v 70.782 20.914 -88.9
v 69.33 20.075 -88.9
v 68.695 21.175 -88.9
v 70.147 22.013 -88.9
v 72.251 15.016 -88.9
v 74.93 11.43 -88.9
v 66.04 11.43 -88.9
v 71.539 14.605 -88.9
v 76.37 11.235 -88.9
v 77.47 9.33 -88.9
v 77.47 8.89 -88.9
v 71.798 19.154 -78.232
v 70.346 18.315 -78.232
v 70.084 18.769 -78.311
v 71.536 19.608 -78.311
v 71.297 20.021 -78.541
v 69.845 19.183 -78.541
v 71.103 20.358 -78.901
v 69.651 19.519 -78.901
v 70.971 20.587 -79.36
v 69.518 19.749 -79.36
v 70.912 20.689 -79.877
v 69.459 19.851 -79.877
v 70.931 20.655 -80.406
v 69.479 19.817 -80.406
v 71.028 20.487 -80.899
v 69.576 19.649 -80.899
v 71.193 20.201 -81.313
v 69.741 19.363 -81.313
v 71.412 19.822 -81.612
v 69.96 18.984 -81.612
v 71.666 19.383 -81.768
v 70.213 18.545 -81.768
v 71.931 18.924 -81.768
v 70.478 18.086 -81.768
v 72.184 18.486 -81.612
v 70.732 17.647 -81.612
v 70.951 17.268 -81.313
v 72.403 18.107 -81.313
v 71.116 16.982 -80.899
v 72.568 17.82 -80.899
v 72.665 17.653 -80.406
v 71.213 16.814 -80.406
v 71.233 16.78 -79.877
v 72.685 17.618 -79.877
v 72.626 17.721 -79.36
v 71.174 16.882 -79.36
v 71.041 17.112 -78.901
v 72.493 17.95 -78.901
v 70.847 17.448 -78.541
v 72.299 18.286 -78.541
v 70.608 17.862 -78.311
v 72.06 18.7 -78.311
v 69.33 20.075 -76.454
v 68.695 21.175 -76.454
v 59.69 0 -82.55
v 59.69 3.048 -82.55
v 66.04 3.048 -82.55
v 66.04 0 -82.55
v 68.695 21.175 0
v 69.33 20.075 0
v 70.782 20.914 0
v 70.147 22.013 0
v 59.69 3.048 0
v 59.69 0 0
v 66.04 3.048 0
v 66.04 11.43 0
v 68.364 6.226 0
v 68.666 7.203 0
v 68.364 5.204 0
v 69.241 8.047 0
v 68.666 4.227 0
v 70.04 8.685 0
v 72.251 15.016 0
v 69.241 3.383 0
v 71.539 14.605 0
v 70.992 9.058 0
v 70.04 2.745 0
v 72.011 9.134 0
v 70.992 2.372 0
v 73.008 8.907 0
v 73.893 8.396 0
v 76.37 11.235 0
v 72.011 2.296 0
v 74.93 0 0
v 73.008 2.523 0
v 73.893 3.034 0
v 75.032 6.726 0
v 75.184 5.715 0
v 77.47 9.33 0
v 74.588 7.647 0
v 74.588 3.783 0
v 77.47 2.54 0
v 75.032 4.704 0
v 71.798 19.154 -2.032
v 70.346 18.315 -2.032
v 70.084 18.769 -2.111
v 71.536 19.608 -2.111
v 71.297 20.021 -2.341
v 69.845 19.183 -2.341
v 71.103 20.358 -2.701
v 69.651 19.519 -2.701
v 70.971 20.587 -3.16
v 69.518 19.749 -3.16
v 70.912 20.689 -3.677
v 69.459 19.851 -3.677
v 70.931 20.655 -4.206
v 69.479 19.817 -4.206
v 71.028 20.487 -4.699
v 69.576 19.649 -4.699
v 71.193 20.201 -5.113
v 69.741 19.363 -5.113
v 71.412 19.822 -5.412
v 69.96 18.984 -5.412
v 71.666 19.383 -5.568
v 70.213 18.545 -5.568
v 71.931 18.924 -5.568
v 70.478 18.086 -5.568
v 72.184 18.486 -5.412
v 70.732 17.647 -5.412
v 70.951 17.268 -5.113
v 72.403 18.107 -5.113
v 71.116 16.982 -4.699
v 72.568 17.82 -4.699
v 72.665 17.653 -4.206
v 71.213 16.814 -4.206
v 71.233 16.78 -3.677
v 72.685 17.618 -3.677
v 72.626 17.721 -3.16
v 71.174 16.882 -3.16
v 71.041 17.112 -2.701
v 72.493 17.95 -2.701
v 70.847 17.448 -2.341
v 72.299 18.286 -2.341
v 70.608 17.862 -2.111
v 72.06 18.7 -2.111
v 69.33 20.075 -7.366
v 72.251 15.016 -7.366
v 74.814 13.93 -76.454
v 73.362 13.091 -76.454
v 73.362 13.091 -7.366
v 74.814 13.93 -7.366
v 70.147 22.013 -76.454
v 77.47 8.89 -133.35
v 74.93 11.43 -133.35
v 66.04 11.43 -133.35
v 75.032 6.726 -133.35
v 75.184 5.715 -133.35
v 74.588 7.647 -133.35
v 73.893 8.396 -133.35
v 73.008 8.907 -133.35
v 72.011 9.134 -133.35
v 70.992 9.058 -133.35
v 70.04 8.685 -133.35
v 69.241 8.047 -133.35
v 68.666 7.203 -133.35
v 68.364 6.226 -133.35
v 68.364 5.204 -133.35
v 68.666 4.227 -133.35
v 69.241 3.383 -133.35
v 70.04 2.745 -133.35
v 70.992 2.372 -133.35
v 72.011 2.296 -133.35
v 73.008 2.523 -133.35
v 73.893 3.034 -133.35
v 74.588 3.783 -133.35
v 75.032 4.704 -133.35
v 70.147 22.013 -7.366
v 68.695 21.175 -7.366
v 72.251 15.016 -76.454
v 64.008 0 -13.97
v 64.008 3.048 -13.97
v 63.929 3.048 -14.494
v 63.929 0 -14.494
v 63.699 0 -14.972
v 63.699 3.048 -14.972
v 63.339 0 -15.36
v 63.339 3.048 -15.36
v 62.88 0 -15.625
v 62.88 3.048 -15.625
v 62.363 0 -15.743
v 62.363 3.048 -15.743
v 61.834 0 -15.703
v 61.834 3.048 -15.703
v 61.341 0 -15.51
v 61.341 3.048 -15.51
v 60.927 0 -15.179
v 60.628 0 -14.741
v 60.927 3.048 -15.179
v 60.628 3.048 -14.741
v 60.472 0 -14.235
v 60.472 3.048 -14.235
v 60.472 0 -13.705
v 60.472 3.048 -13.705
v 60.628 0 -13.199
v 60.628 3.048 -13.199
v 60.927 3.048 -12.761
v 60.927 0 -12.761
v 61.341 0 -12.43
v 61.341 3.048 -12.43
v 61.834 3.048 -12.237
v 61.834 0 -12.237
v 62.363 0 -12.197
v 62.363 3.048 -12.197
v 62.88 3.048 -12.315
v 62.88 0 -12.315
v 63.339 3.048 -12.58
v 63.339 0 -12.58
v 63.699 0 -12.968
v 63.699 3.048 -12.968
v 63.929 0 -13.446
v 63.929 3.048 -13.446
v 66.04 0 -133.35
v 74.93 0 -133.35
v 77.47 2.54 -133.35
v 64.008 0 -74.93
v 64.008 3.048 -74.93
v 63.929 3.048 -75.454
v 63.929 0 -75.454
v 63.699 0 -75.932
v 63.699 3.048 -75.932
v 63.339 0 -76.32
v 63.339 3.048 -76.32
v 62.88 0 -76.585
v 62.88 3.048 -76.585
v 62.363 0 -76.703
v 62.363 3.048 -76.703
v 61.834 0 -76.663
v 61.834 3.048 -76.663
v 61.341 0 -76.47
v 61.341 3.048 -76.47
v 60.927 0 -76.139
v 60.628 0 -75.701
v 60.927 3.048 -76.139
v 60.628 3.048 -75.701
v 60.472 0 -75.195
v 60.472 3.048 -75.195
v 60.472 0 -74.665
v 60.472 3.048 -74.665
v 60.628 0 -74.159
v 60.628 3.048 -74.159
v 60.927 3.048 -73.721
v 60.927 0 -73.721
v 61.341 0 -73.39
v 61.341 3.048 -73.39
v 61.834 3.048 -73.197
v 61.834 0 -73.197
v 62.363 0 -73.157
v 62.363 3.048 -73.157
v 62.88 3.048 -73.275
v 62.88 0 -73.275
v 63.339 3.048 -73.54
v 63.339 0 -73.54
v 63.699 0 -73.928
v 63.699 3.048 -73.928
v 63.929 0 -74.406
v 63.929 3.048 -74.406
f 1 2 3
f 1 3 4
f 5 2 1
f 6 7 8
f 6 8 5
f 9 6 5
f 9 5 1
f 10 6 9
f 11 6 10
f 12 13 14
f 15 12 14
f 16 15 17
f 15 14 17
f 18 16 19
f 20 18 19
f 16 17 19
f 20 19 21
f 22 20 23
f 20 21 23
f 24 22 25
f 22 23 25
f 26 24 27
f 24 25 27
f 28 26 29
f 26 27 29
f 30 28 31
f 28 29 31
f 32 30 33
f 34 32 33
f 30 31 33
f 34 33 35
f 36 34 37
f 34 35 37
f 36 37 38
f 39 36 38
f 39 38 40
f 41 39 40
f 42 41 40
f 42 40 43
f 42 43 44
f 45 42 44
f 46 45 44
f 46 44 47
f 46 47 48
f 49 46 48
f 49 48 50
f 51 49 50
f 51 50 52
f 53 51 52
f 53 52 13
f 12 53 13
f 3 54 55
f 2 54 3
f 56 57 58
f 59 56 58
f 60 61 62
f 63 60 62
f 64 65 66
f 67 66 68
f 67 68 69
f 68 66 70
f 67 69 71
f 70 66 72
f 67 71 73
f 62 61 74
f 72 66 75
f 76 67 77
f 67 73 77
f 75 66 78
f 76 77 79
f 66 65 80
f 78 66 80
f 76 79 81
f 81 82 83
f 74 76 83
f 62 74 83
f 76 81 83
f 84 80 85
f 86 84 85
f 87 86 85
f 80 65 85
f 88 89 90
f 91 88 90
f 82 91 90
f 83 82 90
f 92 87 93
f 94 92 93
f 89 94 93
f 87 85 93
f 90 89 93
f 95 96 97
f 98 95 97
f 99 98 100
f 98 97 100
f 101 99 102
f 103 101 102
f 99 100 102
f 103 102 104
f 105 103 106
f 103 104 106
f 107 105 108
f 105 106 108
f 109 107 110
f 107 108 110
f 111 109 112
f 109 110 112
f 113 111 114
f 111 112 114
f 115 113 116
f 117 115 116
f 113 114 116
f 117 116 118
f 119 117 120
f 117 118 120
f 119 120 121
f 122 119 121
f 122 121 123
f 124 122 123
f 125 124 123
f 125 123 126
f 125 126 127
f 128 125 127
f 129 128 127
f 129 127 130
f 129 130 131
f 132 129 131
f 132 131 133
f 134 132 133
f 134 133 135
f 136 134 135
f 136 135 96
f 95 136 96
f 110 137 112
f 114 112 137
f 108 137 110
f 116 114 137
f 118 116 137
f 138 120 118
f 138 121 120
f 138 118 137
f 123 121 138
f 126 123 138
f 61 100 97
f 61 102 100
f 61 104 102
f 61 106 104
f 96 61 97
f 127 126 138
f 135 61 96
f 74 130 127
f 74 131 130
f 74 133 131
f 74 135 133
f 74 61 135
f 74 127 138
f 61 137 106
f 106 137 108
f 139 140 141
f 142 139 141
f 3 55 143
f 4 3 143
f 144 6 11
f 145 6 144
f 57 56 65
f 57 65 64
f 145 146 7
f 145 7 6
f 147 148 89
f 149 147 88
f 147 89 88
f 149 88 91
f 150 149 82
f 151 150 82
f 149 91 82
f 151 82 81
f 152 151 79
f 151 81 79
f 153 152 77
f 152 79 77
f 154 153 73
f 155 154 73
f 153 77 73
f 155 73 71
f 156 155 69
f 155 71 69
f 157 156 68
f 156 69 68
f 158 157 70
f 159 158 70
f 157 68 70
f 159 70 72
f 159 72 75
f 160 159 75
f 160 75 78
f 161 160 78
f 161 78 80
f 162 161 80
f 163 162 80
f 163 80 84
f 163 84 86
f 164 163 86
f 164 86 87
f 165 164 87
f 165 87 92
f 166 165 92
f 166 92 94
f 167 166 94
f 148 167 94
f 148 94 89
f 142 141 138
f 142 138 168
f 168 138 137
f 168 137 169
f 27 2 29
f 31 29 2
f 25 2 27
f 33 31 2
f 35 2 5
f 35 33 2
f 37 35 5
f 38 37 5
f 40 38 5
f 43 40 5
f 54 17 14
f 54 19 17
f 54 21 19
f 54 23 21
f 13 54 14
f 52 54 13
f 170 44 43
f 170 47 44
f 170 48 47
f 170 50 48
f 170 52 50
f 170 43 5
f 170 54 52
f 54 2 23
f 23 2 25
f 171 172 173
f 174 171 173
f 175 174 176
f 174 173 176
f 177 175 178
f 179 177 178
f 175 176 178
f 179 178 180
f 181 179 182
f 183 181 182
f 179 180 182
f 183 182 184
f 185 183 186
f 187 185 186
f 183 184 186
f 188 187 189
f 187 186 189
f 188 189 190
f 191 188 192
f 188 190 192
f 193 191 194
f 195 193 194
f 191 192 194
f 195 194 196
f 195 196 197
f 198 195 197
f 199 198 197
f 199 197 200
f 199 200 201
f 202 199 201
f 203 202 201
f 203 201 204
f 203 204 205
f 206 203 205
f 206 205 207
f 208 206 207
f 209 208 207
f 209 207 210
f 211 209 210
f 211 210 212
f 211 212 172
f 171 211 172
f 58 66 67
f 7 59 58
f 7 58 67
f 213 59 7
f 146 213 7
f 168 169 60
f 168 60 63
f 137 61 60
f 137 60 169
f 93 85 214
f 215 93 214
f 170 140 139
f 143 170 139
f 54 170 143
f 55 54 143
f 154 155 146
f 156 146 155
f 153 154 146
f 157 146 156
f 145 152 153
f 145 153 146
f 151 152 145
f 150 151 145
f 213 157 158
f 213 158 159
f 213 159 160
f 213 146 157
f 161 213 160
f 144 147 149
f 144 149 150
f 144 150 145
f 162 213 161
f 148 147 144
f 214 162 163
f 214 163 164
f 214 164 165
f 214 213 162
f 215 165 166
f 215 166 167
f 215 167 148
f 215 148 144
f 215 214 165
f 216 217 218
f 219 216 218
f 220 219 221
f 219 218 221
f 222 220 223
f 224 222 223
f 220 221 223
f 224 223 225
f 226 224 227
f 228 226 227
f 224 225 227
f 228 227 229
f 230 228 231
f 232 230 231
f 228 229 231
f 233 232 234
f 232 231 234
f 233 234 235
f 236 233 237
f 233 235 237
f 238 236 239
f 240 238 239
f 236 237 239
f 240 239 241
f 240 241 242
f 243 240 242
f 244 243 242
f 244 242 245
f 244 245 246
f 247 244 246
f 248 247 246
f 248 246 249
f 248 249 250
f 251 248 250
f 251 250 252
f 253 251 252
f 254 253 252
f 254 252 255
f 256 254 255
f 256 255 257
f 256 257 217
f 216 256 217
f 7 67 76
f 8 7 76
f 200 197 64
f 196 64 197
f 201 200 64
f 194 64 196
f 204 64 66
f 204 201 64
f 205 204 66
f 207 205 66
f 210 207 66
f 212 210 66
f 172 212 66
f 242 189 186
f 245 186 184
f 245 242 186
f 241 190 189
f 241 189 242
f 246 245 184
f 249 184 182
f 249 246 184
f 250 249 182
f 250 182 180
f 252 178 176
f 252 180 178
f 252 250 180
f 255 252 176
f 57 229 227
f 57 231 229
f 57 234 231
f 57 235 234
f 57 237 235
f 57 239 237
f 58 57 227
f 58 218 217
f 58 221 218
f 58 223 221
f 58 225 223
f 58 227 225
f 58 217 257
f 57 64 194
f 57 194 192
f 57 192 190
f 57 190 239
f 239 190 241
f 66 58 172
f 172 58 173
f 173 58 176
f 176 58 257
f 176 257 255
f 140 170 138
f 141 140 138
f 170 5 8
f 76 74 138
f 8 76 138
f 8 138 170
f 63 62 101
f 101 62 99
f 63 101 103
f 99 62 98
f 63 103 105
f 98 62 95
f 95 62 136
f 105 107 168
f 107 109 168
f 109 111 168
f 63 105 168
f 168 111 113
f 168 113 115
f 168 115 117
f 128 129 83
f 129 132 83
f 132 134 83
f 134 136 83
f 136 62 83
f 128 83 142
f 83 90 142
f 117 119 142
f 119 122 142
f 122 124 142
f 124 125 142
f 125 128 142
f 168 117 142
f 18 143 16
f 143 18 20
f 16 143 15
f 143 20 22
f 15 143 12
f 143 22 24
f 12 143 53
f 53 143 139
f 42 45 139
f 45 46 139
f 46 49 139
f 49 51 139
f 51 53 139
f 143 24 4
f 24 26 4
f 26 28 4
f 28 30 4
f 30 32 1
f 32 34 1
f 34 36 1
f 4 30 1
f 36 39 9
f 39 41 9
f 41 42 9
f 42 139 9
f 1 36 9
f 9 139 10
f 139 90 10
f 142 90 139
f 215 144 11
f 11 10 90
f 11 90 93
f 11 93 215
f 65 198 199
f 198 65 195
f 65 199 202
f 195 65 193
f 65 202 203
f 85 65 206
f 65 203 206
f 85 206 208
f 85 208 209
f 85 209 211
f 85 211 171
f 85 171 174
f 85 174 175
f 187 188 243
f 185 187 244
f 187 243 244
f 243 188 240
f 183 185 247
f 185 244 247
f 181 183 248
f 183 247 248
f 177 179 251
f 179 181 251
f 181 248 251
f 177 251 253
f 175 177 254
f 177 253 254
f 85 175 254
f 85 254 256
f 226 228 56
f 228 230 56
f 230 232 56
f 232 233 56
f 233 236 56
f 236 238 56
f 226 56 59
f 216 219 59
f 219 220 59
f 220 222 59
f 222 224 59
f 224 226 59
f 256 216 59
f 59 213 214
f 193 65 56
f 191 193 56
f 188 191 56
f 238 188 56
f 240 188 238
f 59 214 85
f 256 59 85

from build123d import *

# Parameters (mm, degrees)
SKETCH1_W           = 77.47
SKETCH1_H           = 133.35
BOSS_EXTRUDE1_DEPTH = 11.43
SKETCH2_R           = 3.429
CUT_EXTRUDE1_DEPTH  = 134.35
CUT_EXTRUDE2_DEPTH  = 12.43
SKETCH4_W           = 54.61
SKETCH4_H           = 6.35
CUT_EXTRUDE3_DEPTH  = 134.35
CHAMFER1_SIZE       = 2.54
SKETCH5_W           = 66.04
SKETCH5_H           = 50.8
CUT_EXTRUDE4_DEPTH  = 12.43
SKETCH6_W           = 53.34
SKETCH6_H           = 82.55
CUT_EXTRUDE5_DEPTH  = 12.43
SKETCH7_R           = 1.778
HOLE_CUTS_1_DEPTH   = 6.08
BOSS_EXTRUDE2_DEPTH = 88.9
CUT_EXTRUDE7_REACH  = 135.35
SKETCH9_W           = 6.35
SKETCH9_H           = 5.08
CUT_EXTRUDE8_REACH  = 135.35
SKETCH10_W          = 6.35
SKETCH10_H          = 1.27
HOLE_CUTS_2_REACH   = 10.608
SKETCH11_R          = 1.778
SKETCH12_W          = 88.9
SKETCH12_H          = 11.176
CUT_EXTRUDE10_DEPTH = 1.27
CUT_EXTRUDE15_DEPTH = 134.35
SKETCH14_W          = 6.35
SKETCH14_H          = 82.55
CUT_EXTRUDE12_DEPTH = 0.762
SKETCH15_W          = 1.676805635
SKETCH15_H          = 88.9
BOSS_EXTRUDE3_DEPTH = 1.27
CUT_EXTRUDE13_REACH = 10.019
SKETCH16_W          = 69.088
SKETCH16_H          = 9.3345
CUT_EXTRUDE14_REACH = 12.28
SKETCH17_W          = 1.27
SKETCH17_H          = 88.9


with BuildPart() as part:
    # Sketch1 → Boss-Extrude1 (new body)
    with BuildSketch(Plane(origin=(0, 0, 0), x_dir=(1, 0, 0), z_dir=(0, 1, 0))):
        with Locations((38.735, 66.675)):
            Rectangle(SKETCH1_W, SKETCH1_H)
    extrude(amount=BOSS_EXTRUDE1_DEPTH)

    # Sketch2 → Cut-Extrude1 (cut, through all)
    with BuildSketch(Plane.XY):
        with Locations((5.715, 5.715)):
            Circle(SKETCH2_R)
        with Locations((71.755, 5.715)):
            Circle(SKETCH2_R)
    extrude(amount=-CUT_EXTRUDE1_DEPTH, mode=Mode.SUBTRACT)

    # Sketch3 → Cut-Extrude2 (cut, through all)
    with BuildSketch(Plane(origin=(0, 11.43, 0), x_dir=(1, 0, 0), z_dir=(0, 1, 0))):
        with BuildLine():
            Line((11.43, 133.35), (11.43, 95.25))
            ThreePointArc((11.43, 95.25), (15.149743879, 86.269743879), (24.13, 82.55))
            Line((24.13, 82.55), (53.34, 82.55))
            ThreePointArc((53.34, 82.55), (62.320256121, 86.269743879), (66.04, 95.25))
            Line((66.04, 95.25), (66.04, 133.35))
            Line((66.04, 133.35), (11.43, 133.35))
        make_face()
    extrude(amount=-CUT_EXTRUDE2_DEPTH, mode=Mode.SUBTRACT)

    # Sketch4 → Cut-Extrude3 (cut, through all)
    with BuildSketch(Plane(origin=(0, 0, -133.35), x_dir=(-1, 0, 0), z_dir=(0, 0, -1))):
        with Locations((-38.735, 8.255)):
            Rectangle(SKETCH4_W, SKETCH4_H)
    extrude(amount=-CUT_EXTRUDE3_DEPTH, mode=Mode.SUBTRACT)

    # Chamfer1
    chamfer1_edges = [part.edges().sort_by_distance(p)[0] for p in [
        (77.47, 11.43, -66.675),
        (0, 11.43, -66.675),
        (77.47, 0, -66.675),
        (0, 0, -66.675),
    ]]
    chamfer(chamfer1_edges, length=CHAMFER1_SIZE)

    # Sketch5 → Cut-Extrude4 (cut, through all)
    with BuildSketch(Plane(origin=(0, 11.43, 0), x_dir=(1, 0, 0), z_dir=(0, 1, 0))):
        with Locations((33.02, 107.95)):
            Rectangle(SKETCH5_W, SKETCH5_H)
    extrude(amount=-CUT_EXTRUDE4_DEPTH, mode=Mode.SUBTRACT)

    # Sketch6 → Cut-Extrude5 (cut, through all)
    with BuildSketch(Plane(origin=(0, 11.43, 0), x_dir=(1, 0, 0), z_dir=(0, 1, 0))):
        with Locations((26.67, 41.275)):
            Rectangle(SKETCH6_W, SKETCH6_H)
    extrude(amount=-CUT_EXTRUDE5_DEPTH, mode=Mode.SUBTRACT)

    # Sketch7 → Hole Cuts 1 (cut, through all)
    with BuildSketch(Plane(origin=(0, 5.08, 0), x_dir=(1, 0, 0), z_dir=(0, 1, 0))):
        with Locations((62.23, 74.93)):
            Circle(SKETCH7_R)
        with Locations((62.23, 13.97)):
            Circle(SKETCH7_R)
    extrude(amount=-HOLE_CUTS_1_DEPTH, mode=Mode.SUBTRACT)

    # Sketch8 → Boss-Extrude2 (add)
    with BuildSketch(Plane.XY):
        Polygon((77.47, 11.869940905), (77.47, 8.89), (74.93, 11.43), (66.04, 11.43), (71.539261314, 14.605), (68.618261314, 19.664320409), (71.882, 21.548640818), align=None)
    extrude(amount=-BOSS_EXTRUDE2_DEPTH)

    # Sketch9 → Cut-Extrude7 (cut, up to next)
    with BuildSketch(Plane.XY, mode=Mode.PRIVATE) as cut_extrude7_sk1:
        with Locations((56.515, 2.54)):
            Rectangle(SKETCH9_W, SKETCH9_H)
    cut_extrude7_tool1 = extrude(cut_extrude7_sk1.sketch, amount=-CUT_EXTRUDE7_REACH, mode=Mode.PRIVATE) & part.part
    add(cut_extrude7_tool1.solids().sort_by_distance((56.515, 2.54, 0))[0], mode=Mode.SUBTRACT)

    # Sketch10 → Cut-Extrude8 (cut, up to next)
    with BuildSketch(Plane.XY, mode=Mode.PRIVATE) as cut_extrude8_sk1:
        with Locations((62.865, 4.445)):
            Rectangle(SKETCH10_W, SKETCH10_H)
    cut_extrude8_tool1 = extrude(cut_extrude8_sk1.sketch, amount=-CUT_EXTRUDE8_REACH, mode=Mode.PRIVATE) & part.part
    add(cut_extrude8_tool1.solids().sort_by_distance((62.865, 4.445, 0))[0], mode=Mode.SUBTRACT)

    # Sketch11 → Hole Cuts 2 (cut, up to next)
    with BuildSketch(Plane(origin=(59.978596497, 34.628658833, 0), x_dir=(0, 0, 1), z_dir=(-0.866025404, -0.5, 0)), mode=Mode.PRIVATE) as hole_cuts_2_sk1:
        with Locations((-3.81, -19.311329635)):
            Circle(SKETCH11_R)
    hole_cuts_2_tool1 = extrude(hole_cuts_2_sk1.sketch, amount=-HOLE_CUTS_2_REACH, mode=Mode.PRIVATE) & part.part
    add(hole_cuts_2_tool1.solids().sort_by_distance((69.634261, 17.904557, -3.81))[0], mode=Mode.SUBTRACT)
    # Sketch11 → Hole Cuts 2 (cut, up to next)
    with BuildSketch(Plane(origin=(59.978596497, 34.628658833, 0), x_dir=(0, 0, 1), z_dir=(-0.866025404, -0.5, 0)), mode=Mode.PRIVATE) as hole_cuts_2_sk2:
        with Locations((-80.01, -19.311329635)):
            Circle(SKETCH11_R)
    hole_cuts_2_tool2 = extrude(hole_cuts_2_sk2.sketch, amount=-HOLE_CUTS_2_REACH, mode=Mode.PRIVATE) & part.part
    add(hole_cuts_2_tool2.solids().sort_by_distance((69.634261, 17.904557, -80.01))[0], mode=Mode.SUBTRACT)

    # Sketch12 → Cut-Extrude10 (cut)
    with BuildSketch(Plane(origin=(63.242335183, 36.512979242, 0), x_dir=(0, 0, -1), z_dir=(0.866025404, 0.5, 0))):
        with Locations((44.45, -22.867329635)):
            Rectangle(SKETCH12_W, SKETCH12_H)
    extrude(amount=-CUT_EXTRUDE10_DEPTH, mode=Mode.SUBTRACT)

    # Sketch22 → Cut-Extrude15 (cut, through all)
    with BuildSketch(Plane.XY):
        Polygon((64.930582409, 17.535238), (69.32999146, 20.075238), (72.25099146, 15.015917591), (67.851582409, 12.475917591), align=None)
    extrude(amount=-CUT_EXTRUDE15_DEPTH, mode=Mode.SUBTRACT)

    # Sketch14 → Cut-Extrude12 (cut)
    with BuildSketch(Plane(origin=(0, 3.81, 0), x_dir=(1, 0, 0), z_dir=(0, 1, 0))):
        with Locations((62.865, 41.275)):
            Rectangle(SKETCH14_W, SKETCH14_H)
    extrude(amount=-CUT_EXTRUDE12_DEPTH, mode=Mode.SUBTRACT)

    # Sketch15 → Boss-Extrude3 (add)
    with BuildSketch(Plane(origin=(8.639664817, -14.964338424, 0), x_dir=(0.866025404, 0.5, 0), z_dir=(-0.5, 0.866025404, 0))):
        with Locations((70.917555667, 44.45)):
            Rectangle(SKETCH15_W, SKETCH15_H)
    extrude(amount=BOSS_EXTRUDE3_DEPTH)

    # Sketch16 → Cut-Extrude13 (cut, up to next)
    with BuildSketch(Plane(origin=(60.690326643, 35.039576424, 0), x_dir=(0, 0, 1), z_dir=(-0.866025404, -0.5, 0)), mode=Mode.PRIVATE) as cut_extrude13_sk1:
        with Locations((-41.91, -20.676579635)):
            Rectangle(SKETCH16_W, SKETCH16_H)
    cut_extrude13_tool1 = extrude(cut_extrude13_sk1.sketch, amount=-CUT_EXTRUDE13_REACH, mode=Mode.PRIVATE) & part.part
    add(cut_extrude13_tool1.solids().sort_by_distance((71.028616, 17.133133, -41.91))[0], mode=Mode.SUBTRACT)

    # Sketch17 → Cut-Extrude14 (cut, up to next)
    with BuildSketch(Plane(origin=(14.227664817, -24.643038337, 0), x_dir=(0.866025404, 0.5, 0), z_dir=(-0.5, 0.866025404, 0)), mode=Mode.PRIVATE) as cut_extrude14_sk1:
        with Locations((72.390958484, 44.45)):
            Rectangle(SKETCH17_W, SKETCH17_H)
    cut_extrude14_tool1 = extrude(cut_extrude14_sk1.sketch, amount=-CUT_EXTRUDE14_REACH, mode=Mode.PRIVATE) & part.part
    add(cut_extrude14_tool1.solids().sort_by_distance((76.920074, 11.552441, -44.45))[0], mode=Mode.SUBTRACT)


solid = part.part
